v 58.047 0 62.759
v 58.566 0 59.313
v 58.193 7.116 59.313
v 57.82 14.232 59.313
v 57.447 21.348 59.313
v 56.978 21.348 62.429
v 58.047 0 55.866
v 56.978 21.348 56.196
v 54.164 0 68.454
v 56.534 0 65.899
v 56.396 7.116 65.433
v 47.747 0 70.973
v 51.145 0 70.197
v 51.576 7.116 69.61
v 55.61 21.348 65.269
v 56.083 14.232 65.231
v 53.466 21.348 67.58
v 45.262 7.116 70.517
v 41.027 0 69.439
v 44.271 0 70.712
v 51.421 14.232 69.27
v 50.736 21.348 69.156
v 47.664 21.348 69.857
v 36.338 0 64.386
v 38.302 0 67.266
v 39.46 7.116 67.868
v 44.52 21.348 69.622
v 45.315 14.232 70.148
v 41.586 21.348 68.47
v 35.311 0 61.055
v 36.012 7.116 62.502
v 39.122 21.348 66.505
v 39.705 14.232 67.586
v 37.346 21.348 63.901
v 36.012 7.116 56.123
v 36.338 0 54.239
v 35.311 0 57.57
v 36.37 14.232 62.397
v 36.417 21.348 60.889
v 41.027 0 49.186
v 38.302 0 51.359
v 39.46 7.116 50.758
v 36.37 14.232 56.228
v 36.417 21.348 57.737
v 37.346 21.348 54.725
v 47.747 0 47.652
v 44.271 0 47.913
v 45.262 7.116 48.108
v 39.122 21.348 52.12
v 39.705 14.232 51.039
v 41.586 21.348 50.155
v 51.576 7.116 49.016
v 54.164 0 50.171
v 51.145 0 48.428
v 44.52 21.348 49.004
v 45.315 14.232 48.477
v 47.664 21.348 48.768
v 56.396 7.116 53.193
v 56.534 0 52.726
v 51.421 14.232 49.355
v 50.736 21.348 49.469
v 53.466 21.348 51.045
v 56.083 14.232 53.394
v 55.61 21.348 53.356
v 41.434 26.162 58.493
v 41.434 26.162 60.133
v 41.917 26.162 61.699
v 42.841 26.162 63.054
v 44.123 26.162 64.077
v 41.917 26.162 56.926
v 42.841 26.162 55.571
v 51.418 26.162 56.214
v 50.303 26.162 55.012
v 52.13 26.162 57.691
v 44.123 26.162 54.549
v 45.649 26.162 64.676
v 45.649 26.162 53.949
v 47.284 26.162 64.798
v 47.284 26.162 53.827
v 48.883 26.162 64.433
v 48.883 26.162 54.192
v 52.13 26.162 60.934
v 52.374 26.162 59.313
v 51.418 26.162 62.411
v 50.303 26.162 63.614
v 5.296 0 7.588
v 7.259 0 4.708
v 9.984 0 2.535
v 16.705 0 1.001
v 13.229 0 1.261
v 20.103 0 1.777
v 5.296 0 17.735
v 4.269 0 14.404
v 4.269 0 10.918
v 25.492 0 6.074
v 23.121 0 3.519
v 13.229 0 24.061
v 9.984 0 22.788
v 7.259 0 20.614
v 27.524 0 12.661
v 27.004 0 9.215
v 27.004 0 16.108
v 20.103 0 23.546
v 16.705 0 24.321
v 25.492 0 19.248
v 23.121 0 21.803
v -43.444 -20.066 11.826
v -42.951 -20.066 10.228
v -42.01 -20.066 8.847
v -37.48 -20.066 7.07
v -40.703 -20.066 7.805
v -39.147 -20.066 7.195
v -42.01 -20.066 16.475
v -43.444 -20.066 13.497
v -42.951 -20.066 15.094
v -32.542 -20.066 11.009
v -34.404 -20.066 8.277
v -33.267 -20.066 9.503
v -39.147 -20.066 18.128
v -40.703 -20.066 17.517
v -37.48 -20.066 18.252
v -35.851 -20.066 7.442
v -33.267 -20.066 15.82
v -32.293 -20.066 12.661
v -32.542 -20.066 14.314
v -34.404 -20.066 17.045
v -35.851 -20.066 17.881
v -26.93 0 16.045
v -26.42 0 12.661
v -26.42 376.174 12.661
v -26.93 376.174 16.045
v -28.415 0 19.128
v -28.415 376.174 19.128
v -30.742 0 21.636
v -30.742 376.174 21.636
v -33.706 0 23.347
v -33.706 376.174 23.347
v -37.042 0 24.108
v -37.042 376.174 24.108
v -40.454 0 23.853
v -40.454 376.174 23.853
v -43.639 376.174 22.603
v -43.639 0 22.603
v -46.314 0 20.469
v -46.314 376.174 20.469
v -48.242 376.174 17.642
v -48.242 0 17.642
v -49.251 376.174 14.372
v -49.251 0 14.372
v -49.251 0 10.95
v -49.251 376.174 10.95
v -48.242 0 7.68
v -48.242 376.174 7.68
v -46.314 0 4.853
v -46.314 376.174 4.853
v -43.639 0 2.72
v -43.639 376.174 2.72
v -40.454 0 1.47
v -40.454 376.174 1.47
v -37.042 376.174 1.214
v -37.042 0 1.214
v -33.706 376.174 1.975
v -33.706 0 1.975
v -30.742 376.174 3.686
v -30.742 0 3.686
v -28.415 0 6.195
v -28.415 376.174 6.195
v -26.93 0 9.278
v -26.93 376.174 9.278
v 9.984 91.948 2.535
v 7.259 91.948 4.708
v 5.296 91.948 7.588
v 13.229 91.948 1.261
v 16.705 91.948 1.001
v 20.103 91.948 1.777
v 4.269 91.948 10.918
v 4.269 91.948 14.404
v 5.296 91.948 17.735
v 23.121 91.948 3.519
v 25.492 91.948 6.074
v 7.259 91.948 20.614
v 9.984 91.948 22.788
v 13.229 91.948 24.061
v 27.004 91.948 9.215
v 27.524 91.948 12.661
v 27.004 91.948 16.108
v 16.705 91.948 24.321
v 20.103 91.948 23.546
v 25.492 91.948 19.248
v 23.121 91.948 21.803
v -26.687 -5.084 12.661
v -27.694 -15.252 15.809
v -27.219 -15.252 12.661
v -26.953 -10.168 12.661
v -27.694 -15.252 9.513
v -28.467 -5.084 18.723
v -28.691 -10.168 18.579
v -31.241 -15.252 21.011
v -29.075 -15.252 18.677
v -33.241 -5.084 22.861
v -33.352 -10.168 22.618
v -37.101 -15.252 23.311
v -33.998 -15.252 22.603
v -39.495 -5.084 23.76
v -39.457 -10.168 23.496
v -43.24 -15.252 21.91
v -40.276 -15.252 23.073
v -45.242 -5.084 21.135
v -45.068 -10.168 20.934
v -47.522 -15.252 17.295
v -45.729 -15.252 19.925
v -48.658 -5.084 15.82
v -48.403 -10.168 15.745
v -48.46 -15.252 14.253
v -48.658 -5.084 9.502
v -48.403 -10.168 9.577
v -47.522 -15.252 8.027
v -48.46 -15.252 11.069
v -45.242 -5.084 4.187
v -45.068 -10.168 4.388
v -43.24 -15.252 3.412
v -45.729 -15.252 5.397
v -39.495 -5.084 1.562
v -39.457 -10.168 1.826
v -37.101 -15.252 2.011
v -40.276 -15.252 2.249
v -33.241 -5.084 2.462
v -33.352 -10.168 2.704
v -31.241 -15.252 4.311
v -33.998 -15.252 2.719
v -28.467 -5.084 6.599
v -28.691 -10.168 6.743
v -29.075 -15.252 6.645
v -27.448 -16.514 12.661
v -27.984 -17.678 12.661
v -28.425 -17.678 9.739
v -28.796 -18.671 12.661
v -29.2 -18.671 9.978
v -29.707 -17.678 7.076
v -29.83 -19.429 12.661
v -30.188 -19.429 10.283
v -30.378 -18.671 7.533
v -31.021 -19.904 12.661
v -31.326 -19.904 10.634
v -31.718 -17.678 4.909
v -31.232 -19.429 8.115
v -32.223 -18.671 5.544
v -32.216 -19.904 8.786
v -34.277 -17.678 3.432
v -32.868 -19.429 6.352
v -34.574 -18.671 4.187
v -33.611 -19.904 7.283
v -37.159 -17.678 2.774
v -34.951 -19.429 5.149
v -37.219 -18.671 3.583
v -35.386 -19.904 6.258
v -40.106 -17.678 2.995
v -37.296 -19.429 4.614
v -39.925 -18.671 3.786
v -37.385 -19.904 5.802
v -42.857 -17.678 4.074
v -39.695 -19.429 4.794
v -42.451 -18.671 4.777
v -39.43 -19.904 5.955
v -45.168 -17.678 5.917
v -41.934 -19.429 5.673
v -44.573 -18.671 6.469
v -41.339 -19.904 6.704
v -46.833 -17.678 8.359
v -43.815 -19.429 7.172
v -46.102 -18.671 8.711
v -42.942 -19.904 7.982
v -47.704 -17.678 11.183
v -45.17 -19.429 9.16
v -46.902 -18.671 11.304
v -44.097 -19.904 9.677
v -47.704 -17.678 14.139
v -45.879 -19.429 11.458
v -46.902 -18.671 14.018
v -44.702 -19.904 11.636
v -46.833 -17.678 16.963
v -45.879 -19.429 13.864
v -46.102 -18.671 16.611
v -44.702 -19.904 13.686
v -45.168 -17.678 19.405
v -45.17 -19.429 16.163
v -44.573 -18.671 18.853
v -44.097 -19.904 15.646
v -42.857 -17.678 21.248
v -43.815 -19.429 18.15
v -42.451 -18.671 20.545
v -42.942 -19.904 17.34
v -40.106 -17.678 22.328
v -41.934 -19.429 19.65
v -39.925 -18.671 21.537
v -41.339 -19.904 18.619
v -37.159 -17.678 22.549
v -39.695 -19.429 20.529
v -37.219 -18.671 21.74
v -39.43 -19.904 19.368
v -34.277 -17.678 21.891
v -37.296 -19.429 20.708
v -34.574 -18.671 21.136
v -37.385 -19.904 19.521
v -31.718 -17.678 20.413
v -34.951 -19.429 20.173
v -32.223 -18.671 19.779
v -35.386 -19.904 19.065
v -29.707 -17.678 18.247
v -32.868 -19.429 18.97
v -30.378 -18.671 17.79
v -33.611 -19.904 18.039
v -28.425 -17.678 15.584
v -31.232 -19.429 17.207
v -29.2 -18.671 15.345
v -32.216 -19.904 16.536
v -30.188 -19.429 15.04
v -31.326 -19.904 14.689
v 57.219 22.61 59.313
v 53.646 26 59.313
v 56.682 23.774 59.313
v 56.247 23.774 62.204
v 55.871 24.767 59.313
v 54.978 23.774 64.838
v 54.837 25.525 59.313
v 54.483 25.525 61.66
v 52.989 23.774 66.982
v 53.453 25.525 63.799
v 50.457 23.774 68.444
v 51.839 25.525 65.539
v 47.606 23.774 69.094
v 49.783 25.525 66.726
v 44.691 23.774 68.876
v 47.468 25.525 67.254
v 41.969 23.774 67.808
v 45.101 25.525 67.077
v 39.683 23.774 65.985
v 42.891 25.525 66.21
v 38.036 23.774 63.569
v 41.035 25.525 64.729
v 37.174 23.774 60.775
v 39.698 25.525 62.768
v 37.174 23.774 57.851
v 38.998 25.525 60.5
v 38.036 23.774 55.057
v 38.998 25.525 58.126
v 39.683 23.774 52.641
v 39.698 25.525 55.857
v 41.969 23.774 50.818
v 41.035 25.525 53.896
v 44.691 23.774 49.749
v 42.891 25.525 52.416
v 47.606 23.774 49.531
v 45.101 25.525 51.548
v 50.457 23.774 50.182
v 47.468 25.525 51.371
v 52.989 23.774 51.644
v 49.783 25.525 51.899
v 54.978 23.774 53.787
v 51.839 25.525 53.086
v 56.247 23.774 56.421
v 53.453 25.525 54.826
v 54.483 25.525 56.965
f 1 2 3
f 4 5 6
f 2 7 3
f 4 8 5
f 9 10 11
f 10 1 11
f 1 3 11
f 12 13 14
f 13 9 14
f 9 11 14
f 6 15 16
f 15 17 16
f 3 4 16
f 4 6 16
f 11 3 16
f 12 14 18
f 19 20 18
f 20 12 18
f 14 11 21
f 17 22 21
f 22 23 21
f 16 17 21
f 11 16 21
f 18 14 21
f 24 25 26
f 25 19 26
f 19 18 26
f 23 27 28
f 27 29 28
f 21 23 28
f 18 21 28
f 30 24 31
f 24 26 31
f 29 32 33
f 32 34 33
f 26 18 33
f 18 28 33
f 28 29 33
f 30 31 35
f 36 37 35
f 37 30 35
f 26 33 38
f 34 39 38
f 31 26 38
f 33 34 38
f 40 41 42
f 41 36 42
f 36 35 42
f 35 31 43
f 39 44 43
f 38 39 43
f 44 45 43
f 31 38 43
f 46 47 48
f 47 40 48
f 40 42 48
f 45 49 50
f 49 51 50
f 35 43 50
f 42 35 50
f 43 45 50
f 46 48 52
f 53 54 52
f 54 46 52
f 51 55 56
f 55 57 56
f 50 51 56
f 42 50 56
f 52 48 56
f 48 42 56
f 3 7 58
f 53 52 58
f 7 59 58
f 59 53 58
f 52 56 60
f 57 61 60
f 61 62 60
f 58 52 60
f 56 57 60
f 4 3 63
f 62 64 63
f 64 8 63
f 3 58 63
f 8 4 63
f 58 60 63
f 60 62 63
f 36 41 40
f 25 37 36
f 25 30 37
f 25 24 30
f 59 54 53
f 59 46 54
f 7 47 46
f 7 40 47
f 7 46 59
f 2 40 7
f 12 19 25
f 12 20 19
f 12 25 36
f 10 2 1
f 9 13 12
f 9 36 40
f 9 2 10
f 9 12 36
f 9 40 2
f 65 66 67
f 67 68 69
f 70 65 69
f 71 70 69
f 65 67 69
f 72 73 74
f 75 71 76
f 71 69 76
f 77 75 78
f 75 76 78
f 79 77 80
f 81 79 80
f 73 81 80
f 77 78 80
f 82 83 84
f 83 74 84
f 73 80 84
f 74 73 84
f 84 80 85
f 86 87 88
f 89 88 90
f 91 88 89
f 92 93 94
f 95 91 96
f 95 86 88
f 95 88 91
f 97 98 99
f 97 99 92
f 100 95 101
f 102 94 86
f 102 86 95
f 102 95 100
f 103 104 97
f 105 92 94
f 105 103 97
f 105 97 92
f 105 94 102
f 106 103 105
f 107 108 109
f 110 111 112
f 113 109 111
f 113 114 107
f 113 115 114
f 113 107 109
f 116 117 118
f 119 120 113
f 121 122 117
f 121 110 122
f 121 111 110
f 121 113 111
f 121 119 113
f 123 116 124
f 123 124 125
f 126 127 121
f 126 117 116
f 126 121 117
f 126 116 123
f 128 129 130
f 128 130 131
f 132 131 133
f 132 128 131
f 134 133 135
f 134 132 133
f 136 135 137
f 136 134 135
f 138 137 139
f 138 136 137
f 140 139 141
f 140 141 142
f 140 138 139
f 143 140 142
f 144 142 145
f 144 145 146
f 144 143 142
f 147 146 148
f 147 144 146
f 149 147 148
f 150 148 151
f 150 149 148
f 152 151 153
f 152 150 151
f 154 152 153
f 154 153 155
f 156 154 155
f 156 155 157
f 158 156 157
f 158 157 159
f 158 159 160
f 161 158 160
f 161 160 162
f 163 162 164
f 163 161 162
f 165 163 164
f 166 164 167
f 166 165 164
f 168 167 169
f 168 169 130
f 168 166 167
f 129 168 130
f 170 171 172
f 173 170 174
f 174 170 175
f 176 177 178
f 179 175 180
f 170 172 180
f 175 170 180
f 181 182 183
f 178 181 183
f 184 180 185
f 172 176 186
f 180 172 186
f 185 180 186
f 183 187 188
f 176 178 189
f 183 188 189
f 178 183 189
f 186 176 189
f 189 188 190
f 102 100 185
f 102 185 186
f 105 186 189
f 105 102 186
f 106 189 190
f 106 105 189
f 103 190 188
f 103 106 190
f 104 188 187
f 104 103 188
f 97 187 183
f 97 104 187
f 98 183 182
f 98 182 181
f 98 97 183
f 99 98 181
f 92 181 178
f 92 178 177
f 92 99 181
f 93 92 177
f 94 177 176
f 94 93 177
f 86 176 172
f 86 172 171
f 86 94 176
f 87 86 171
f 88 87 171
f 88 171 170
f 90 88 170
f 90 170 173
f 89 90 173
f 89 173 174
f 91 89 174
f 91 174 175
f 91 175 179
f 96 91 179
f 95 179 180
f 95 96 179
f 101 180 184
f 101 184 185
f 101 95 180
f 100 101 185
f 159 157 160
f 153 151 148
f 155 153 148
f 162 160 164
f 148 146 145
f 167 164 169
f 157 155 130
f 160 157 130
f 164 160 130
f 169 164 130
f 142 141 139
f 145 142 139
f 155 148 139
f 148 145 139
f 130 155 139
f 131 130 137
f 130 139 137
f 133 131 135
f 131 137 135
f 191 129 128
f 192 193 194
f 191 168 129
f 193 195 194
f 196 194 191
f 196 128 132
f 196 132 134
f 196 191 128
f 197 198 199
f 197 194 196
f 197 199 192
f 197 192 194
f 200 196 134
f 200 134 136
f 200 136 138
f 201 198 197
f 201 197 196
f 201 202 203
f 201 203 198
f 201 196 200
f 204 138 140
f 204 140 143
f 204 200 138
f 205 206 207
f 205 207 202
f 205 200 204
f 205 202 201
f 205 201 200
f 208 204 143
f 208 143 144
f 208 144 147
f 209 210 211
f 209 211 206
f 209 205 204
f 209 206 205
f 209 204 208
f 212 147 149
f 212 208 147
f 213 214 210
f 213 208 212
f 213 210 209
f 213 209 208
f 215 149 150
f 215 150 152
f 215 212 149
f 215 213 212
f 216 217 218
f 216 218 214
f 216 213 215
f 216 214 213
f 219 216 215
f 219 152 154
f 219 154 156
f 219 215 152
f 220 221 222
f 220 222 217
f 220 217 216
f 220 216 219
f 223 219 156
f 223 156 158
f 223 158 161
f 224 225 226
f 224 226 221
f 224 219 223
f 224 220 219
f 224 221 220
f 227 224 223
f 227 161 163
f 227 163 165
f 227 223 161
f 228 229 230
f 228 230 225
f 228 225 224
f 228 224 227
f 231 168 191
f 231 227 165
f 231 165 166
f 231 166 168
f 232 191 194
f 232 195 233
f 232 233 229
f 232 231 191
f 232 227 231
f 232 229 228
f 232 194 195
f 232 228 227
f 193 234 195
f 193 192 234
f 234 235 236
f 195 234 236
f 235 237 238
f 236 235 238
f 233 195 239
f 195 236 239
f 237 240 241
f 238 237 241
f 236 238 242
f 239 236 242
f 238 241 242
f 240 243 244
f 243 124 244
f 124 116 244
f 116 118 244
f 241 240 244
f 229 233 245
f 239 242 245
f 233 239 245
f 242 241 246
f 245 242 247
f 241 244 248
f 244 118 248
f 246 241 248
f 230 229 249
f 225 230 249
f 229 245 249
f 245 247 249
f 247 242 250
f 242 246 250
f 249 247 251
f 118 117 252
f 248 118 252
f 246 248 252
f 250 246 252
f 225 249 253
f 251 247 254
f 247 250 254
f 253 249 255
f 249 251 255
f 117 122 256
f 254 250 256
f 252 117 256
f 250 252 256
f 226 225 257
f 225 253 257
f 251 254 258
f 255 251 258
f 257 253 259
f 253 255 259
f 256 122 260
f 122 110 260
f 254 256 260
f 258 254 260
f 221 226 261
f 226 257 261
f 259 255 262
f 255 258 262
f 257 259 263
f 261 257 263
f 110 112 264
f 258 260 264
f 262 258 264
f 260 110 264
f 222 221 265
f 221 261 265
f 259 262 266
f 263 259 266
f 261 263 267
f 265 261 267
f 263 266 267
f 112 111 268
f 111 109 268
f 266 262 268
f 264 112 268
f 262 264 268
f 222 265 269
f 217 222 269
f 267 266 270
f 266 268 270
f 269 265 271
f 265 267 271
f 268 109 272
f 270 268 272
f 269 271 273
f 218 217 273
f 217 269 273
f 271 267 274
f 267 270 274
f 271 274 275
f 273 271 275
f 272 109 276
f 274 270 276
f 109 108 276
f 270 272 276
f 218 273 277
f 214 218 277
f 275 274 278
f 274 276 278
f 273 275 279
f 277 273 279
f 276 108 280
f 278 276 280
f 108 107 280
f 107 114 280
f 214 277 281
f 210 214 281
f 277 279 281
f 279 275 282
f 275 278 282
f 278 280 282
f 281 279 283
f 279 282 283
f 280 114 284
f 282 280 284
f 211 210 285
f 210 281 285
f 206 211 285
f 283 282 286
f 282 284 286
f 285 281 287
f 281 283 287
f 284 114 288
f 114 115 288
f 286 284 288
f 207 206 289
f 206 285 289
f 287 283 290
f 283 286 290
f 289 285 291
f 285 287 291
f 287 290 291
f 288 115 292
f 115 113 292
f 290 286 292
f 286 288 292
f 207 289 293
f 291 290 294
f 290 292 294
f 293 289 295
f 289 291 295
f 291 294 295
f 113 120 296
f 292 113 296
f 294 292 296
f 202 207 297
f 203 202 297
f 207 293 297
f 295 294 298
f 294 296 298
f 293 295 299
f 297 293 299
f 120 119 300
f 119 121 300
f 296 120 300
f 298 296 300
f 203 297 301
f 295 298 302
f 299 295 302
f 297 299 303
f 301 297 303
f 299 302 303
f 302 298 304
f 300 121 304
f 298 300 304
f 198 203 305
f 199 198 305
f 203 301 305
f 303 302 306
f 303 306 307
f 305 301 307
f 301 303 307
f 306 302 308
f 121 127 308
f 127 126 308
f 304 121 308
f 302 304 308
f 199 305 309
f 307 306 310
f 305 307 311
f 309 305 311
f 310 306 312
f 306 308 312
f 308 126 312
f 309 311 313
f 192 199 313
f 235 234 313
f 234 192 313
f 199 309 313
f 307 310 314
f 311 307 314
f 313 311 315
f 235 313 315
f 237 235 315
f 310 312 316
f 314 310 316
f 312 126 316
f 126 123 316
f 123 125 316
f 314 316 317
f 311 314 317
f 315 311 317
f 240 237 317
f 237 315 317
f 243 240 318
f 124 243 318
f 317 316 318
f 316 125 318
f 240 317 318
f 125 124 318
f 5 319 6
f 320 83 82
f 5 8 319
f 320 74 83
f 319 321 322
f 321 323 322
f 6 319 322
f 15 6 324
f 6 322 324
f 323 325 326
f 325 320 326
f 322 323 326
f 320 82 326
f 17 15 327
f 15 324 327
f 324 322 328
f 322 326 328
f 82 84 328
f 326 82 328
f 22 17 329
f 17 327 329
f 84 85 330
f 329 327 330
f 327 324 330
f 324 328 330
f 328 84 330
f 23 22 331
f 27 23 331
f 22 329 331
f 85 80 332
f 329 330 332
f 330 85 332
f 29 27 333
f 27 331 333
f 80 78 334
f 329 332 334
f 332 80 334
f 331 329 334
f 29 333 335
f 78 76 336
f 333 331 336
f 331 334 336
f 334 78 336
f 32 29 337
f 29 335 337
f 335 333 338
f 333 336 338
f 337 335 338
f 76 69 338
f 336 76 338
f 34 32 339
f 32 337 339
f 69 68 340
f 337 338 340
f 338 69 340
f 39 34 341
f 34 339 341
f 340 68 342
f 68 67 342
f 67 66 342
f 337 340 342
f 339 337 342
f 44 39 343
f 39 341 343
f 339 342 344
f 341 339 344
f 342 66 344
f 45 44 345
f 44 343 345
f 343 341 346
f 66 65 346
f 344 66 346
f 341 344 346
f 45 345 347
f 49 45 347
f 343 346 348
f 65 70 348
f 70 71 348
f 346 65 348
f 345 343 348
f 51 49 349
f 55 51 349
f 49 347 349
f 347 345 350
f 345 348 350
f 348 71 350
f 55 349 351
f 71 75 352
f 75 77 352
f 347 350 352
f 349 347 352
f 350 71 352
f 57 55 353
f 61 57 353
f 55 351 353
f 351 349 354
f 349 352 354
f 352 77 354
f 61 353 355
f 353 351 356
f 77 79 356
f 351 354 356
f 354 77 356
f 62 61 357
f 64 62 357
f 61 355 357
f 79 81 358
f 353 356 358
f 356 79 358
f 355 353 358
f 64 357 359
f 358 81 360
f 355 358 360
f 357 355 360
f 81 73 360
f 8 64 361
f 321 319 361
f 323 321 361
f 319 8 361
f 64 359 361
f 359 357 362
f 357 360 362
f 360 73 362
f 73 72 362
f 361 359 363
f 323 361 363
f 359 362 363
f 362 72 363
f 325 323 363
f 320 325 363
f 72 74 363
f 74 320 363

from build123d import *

# Parameters (mm, degrees)
F0_R     = 11.4793323505
F1_DEPTH = 376.174
F2_R     = 11.4793323505
F3_DEPTH = 20.066
F3_TAPER = 3
F4_R     = 5.08
F0_R_2   = 11.69289
F5_DEPTH = 91.948
F6_R     = 11.69289
F7_DEPTH = 26.162
F7_TAPER = 3
F8_R     = 5.08


with BuildPart() as f1:
    # F0 (on Front) → F1 (new body)
    with BuildSketch(Plane.XZ):
        with Locations((-37.8994987326, 12.6611953601)):
            Circle(F0_R)
    extrude(amount=-F1_DEPTH)

    # F2 (on face) → F3 (join)
    with BuildSketch(Plane.XZ):
        with Locations((-37.8994987326, 12.6611953601)):
            Circle(F2_R)
    extrude(amount=F3_DEPTH, taper=F3_TAPER)

    # F4
    f4_edges = [f1.edges().sort_by_distance(p)[0] for p in [
        (-48.327217, -20.066, 12.661195),
    ]]
    fillet(f4_edges, radius=F4_R)


with BuildPart() as f5:
    # F0 (on Front) → F5 (new body)
    with BuildSketch(Plane.XZ):
        with Locations((15.8309266554, 12.6611953601)):
            Circle(F0_R_2)
    extrude(amount=-F5_DEPTH)


with BuildPart() as f7:
    # F6 (on Front) → F7 (new body)
    with BuildSketch(Plane.XZ):
        with Locations((46.8732975423, 59.3126304448)):
            Circle(F6_R)
    extrude(amount=-F7_DEPTH, taper=F7_TAPER)

    # F8
    f8_edges = [f7.edges().sort_by_distance(p)[0] for p in [
        (36.5515, 26.162, 59.31263),
    ]]
    fillet(f8_edges, radius=F8_R)


solid = Compound([f1.part, f5.part, f7.part])
